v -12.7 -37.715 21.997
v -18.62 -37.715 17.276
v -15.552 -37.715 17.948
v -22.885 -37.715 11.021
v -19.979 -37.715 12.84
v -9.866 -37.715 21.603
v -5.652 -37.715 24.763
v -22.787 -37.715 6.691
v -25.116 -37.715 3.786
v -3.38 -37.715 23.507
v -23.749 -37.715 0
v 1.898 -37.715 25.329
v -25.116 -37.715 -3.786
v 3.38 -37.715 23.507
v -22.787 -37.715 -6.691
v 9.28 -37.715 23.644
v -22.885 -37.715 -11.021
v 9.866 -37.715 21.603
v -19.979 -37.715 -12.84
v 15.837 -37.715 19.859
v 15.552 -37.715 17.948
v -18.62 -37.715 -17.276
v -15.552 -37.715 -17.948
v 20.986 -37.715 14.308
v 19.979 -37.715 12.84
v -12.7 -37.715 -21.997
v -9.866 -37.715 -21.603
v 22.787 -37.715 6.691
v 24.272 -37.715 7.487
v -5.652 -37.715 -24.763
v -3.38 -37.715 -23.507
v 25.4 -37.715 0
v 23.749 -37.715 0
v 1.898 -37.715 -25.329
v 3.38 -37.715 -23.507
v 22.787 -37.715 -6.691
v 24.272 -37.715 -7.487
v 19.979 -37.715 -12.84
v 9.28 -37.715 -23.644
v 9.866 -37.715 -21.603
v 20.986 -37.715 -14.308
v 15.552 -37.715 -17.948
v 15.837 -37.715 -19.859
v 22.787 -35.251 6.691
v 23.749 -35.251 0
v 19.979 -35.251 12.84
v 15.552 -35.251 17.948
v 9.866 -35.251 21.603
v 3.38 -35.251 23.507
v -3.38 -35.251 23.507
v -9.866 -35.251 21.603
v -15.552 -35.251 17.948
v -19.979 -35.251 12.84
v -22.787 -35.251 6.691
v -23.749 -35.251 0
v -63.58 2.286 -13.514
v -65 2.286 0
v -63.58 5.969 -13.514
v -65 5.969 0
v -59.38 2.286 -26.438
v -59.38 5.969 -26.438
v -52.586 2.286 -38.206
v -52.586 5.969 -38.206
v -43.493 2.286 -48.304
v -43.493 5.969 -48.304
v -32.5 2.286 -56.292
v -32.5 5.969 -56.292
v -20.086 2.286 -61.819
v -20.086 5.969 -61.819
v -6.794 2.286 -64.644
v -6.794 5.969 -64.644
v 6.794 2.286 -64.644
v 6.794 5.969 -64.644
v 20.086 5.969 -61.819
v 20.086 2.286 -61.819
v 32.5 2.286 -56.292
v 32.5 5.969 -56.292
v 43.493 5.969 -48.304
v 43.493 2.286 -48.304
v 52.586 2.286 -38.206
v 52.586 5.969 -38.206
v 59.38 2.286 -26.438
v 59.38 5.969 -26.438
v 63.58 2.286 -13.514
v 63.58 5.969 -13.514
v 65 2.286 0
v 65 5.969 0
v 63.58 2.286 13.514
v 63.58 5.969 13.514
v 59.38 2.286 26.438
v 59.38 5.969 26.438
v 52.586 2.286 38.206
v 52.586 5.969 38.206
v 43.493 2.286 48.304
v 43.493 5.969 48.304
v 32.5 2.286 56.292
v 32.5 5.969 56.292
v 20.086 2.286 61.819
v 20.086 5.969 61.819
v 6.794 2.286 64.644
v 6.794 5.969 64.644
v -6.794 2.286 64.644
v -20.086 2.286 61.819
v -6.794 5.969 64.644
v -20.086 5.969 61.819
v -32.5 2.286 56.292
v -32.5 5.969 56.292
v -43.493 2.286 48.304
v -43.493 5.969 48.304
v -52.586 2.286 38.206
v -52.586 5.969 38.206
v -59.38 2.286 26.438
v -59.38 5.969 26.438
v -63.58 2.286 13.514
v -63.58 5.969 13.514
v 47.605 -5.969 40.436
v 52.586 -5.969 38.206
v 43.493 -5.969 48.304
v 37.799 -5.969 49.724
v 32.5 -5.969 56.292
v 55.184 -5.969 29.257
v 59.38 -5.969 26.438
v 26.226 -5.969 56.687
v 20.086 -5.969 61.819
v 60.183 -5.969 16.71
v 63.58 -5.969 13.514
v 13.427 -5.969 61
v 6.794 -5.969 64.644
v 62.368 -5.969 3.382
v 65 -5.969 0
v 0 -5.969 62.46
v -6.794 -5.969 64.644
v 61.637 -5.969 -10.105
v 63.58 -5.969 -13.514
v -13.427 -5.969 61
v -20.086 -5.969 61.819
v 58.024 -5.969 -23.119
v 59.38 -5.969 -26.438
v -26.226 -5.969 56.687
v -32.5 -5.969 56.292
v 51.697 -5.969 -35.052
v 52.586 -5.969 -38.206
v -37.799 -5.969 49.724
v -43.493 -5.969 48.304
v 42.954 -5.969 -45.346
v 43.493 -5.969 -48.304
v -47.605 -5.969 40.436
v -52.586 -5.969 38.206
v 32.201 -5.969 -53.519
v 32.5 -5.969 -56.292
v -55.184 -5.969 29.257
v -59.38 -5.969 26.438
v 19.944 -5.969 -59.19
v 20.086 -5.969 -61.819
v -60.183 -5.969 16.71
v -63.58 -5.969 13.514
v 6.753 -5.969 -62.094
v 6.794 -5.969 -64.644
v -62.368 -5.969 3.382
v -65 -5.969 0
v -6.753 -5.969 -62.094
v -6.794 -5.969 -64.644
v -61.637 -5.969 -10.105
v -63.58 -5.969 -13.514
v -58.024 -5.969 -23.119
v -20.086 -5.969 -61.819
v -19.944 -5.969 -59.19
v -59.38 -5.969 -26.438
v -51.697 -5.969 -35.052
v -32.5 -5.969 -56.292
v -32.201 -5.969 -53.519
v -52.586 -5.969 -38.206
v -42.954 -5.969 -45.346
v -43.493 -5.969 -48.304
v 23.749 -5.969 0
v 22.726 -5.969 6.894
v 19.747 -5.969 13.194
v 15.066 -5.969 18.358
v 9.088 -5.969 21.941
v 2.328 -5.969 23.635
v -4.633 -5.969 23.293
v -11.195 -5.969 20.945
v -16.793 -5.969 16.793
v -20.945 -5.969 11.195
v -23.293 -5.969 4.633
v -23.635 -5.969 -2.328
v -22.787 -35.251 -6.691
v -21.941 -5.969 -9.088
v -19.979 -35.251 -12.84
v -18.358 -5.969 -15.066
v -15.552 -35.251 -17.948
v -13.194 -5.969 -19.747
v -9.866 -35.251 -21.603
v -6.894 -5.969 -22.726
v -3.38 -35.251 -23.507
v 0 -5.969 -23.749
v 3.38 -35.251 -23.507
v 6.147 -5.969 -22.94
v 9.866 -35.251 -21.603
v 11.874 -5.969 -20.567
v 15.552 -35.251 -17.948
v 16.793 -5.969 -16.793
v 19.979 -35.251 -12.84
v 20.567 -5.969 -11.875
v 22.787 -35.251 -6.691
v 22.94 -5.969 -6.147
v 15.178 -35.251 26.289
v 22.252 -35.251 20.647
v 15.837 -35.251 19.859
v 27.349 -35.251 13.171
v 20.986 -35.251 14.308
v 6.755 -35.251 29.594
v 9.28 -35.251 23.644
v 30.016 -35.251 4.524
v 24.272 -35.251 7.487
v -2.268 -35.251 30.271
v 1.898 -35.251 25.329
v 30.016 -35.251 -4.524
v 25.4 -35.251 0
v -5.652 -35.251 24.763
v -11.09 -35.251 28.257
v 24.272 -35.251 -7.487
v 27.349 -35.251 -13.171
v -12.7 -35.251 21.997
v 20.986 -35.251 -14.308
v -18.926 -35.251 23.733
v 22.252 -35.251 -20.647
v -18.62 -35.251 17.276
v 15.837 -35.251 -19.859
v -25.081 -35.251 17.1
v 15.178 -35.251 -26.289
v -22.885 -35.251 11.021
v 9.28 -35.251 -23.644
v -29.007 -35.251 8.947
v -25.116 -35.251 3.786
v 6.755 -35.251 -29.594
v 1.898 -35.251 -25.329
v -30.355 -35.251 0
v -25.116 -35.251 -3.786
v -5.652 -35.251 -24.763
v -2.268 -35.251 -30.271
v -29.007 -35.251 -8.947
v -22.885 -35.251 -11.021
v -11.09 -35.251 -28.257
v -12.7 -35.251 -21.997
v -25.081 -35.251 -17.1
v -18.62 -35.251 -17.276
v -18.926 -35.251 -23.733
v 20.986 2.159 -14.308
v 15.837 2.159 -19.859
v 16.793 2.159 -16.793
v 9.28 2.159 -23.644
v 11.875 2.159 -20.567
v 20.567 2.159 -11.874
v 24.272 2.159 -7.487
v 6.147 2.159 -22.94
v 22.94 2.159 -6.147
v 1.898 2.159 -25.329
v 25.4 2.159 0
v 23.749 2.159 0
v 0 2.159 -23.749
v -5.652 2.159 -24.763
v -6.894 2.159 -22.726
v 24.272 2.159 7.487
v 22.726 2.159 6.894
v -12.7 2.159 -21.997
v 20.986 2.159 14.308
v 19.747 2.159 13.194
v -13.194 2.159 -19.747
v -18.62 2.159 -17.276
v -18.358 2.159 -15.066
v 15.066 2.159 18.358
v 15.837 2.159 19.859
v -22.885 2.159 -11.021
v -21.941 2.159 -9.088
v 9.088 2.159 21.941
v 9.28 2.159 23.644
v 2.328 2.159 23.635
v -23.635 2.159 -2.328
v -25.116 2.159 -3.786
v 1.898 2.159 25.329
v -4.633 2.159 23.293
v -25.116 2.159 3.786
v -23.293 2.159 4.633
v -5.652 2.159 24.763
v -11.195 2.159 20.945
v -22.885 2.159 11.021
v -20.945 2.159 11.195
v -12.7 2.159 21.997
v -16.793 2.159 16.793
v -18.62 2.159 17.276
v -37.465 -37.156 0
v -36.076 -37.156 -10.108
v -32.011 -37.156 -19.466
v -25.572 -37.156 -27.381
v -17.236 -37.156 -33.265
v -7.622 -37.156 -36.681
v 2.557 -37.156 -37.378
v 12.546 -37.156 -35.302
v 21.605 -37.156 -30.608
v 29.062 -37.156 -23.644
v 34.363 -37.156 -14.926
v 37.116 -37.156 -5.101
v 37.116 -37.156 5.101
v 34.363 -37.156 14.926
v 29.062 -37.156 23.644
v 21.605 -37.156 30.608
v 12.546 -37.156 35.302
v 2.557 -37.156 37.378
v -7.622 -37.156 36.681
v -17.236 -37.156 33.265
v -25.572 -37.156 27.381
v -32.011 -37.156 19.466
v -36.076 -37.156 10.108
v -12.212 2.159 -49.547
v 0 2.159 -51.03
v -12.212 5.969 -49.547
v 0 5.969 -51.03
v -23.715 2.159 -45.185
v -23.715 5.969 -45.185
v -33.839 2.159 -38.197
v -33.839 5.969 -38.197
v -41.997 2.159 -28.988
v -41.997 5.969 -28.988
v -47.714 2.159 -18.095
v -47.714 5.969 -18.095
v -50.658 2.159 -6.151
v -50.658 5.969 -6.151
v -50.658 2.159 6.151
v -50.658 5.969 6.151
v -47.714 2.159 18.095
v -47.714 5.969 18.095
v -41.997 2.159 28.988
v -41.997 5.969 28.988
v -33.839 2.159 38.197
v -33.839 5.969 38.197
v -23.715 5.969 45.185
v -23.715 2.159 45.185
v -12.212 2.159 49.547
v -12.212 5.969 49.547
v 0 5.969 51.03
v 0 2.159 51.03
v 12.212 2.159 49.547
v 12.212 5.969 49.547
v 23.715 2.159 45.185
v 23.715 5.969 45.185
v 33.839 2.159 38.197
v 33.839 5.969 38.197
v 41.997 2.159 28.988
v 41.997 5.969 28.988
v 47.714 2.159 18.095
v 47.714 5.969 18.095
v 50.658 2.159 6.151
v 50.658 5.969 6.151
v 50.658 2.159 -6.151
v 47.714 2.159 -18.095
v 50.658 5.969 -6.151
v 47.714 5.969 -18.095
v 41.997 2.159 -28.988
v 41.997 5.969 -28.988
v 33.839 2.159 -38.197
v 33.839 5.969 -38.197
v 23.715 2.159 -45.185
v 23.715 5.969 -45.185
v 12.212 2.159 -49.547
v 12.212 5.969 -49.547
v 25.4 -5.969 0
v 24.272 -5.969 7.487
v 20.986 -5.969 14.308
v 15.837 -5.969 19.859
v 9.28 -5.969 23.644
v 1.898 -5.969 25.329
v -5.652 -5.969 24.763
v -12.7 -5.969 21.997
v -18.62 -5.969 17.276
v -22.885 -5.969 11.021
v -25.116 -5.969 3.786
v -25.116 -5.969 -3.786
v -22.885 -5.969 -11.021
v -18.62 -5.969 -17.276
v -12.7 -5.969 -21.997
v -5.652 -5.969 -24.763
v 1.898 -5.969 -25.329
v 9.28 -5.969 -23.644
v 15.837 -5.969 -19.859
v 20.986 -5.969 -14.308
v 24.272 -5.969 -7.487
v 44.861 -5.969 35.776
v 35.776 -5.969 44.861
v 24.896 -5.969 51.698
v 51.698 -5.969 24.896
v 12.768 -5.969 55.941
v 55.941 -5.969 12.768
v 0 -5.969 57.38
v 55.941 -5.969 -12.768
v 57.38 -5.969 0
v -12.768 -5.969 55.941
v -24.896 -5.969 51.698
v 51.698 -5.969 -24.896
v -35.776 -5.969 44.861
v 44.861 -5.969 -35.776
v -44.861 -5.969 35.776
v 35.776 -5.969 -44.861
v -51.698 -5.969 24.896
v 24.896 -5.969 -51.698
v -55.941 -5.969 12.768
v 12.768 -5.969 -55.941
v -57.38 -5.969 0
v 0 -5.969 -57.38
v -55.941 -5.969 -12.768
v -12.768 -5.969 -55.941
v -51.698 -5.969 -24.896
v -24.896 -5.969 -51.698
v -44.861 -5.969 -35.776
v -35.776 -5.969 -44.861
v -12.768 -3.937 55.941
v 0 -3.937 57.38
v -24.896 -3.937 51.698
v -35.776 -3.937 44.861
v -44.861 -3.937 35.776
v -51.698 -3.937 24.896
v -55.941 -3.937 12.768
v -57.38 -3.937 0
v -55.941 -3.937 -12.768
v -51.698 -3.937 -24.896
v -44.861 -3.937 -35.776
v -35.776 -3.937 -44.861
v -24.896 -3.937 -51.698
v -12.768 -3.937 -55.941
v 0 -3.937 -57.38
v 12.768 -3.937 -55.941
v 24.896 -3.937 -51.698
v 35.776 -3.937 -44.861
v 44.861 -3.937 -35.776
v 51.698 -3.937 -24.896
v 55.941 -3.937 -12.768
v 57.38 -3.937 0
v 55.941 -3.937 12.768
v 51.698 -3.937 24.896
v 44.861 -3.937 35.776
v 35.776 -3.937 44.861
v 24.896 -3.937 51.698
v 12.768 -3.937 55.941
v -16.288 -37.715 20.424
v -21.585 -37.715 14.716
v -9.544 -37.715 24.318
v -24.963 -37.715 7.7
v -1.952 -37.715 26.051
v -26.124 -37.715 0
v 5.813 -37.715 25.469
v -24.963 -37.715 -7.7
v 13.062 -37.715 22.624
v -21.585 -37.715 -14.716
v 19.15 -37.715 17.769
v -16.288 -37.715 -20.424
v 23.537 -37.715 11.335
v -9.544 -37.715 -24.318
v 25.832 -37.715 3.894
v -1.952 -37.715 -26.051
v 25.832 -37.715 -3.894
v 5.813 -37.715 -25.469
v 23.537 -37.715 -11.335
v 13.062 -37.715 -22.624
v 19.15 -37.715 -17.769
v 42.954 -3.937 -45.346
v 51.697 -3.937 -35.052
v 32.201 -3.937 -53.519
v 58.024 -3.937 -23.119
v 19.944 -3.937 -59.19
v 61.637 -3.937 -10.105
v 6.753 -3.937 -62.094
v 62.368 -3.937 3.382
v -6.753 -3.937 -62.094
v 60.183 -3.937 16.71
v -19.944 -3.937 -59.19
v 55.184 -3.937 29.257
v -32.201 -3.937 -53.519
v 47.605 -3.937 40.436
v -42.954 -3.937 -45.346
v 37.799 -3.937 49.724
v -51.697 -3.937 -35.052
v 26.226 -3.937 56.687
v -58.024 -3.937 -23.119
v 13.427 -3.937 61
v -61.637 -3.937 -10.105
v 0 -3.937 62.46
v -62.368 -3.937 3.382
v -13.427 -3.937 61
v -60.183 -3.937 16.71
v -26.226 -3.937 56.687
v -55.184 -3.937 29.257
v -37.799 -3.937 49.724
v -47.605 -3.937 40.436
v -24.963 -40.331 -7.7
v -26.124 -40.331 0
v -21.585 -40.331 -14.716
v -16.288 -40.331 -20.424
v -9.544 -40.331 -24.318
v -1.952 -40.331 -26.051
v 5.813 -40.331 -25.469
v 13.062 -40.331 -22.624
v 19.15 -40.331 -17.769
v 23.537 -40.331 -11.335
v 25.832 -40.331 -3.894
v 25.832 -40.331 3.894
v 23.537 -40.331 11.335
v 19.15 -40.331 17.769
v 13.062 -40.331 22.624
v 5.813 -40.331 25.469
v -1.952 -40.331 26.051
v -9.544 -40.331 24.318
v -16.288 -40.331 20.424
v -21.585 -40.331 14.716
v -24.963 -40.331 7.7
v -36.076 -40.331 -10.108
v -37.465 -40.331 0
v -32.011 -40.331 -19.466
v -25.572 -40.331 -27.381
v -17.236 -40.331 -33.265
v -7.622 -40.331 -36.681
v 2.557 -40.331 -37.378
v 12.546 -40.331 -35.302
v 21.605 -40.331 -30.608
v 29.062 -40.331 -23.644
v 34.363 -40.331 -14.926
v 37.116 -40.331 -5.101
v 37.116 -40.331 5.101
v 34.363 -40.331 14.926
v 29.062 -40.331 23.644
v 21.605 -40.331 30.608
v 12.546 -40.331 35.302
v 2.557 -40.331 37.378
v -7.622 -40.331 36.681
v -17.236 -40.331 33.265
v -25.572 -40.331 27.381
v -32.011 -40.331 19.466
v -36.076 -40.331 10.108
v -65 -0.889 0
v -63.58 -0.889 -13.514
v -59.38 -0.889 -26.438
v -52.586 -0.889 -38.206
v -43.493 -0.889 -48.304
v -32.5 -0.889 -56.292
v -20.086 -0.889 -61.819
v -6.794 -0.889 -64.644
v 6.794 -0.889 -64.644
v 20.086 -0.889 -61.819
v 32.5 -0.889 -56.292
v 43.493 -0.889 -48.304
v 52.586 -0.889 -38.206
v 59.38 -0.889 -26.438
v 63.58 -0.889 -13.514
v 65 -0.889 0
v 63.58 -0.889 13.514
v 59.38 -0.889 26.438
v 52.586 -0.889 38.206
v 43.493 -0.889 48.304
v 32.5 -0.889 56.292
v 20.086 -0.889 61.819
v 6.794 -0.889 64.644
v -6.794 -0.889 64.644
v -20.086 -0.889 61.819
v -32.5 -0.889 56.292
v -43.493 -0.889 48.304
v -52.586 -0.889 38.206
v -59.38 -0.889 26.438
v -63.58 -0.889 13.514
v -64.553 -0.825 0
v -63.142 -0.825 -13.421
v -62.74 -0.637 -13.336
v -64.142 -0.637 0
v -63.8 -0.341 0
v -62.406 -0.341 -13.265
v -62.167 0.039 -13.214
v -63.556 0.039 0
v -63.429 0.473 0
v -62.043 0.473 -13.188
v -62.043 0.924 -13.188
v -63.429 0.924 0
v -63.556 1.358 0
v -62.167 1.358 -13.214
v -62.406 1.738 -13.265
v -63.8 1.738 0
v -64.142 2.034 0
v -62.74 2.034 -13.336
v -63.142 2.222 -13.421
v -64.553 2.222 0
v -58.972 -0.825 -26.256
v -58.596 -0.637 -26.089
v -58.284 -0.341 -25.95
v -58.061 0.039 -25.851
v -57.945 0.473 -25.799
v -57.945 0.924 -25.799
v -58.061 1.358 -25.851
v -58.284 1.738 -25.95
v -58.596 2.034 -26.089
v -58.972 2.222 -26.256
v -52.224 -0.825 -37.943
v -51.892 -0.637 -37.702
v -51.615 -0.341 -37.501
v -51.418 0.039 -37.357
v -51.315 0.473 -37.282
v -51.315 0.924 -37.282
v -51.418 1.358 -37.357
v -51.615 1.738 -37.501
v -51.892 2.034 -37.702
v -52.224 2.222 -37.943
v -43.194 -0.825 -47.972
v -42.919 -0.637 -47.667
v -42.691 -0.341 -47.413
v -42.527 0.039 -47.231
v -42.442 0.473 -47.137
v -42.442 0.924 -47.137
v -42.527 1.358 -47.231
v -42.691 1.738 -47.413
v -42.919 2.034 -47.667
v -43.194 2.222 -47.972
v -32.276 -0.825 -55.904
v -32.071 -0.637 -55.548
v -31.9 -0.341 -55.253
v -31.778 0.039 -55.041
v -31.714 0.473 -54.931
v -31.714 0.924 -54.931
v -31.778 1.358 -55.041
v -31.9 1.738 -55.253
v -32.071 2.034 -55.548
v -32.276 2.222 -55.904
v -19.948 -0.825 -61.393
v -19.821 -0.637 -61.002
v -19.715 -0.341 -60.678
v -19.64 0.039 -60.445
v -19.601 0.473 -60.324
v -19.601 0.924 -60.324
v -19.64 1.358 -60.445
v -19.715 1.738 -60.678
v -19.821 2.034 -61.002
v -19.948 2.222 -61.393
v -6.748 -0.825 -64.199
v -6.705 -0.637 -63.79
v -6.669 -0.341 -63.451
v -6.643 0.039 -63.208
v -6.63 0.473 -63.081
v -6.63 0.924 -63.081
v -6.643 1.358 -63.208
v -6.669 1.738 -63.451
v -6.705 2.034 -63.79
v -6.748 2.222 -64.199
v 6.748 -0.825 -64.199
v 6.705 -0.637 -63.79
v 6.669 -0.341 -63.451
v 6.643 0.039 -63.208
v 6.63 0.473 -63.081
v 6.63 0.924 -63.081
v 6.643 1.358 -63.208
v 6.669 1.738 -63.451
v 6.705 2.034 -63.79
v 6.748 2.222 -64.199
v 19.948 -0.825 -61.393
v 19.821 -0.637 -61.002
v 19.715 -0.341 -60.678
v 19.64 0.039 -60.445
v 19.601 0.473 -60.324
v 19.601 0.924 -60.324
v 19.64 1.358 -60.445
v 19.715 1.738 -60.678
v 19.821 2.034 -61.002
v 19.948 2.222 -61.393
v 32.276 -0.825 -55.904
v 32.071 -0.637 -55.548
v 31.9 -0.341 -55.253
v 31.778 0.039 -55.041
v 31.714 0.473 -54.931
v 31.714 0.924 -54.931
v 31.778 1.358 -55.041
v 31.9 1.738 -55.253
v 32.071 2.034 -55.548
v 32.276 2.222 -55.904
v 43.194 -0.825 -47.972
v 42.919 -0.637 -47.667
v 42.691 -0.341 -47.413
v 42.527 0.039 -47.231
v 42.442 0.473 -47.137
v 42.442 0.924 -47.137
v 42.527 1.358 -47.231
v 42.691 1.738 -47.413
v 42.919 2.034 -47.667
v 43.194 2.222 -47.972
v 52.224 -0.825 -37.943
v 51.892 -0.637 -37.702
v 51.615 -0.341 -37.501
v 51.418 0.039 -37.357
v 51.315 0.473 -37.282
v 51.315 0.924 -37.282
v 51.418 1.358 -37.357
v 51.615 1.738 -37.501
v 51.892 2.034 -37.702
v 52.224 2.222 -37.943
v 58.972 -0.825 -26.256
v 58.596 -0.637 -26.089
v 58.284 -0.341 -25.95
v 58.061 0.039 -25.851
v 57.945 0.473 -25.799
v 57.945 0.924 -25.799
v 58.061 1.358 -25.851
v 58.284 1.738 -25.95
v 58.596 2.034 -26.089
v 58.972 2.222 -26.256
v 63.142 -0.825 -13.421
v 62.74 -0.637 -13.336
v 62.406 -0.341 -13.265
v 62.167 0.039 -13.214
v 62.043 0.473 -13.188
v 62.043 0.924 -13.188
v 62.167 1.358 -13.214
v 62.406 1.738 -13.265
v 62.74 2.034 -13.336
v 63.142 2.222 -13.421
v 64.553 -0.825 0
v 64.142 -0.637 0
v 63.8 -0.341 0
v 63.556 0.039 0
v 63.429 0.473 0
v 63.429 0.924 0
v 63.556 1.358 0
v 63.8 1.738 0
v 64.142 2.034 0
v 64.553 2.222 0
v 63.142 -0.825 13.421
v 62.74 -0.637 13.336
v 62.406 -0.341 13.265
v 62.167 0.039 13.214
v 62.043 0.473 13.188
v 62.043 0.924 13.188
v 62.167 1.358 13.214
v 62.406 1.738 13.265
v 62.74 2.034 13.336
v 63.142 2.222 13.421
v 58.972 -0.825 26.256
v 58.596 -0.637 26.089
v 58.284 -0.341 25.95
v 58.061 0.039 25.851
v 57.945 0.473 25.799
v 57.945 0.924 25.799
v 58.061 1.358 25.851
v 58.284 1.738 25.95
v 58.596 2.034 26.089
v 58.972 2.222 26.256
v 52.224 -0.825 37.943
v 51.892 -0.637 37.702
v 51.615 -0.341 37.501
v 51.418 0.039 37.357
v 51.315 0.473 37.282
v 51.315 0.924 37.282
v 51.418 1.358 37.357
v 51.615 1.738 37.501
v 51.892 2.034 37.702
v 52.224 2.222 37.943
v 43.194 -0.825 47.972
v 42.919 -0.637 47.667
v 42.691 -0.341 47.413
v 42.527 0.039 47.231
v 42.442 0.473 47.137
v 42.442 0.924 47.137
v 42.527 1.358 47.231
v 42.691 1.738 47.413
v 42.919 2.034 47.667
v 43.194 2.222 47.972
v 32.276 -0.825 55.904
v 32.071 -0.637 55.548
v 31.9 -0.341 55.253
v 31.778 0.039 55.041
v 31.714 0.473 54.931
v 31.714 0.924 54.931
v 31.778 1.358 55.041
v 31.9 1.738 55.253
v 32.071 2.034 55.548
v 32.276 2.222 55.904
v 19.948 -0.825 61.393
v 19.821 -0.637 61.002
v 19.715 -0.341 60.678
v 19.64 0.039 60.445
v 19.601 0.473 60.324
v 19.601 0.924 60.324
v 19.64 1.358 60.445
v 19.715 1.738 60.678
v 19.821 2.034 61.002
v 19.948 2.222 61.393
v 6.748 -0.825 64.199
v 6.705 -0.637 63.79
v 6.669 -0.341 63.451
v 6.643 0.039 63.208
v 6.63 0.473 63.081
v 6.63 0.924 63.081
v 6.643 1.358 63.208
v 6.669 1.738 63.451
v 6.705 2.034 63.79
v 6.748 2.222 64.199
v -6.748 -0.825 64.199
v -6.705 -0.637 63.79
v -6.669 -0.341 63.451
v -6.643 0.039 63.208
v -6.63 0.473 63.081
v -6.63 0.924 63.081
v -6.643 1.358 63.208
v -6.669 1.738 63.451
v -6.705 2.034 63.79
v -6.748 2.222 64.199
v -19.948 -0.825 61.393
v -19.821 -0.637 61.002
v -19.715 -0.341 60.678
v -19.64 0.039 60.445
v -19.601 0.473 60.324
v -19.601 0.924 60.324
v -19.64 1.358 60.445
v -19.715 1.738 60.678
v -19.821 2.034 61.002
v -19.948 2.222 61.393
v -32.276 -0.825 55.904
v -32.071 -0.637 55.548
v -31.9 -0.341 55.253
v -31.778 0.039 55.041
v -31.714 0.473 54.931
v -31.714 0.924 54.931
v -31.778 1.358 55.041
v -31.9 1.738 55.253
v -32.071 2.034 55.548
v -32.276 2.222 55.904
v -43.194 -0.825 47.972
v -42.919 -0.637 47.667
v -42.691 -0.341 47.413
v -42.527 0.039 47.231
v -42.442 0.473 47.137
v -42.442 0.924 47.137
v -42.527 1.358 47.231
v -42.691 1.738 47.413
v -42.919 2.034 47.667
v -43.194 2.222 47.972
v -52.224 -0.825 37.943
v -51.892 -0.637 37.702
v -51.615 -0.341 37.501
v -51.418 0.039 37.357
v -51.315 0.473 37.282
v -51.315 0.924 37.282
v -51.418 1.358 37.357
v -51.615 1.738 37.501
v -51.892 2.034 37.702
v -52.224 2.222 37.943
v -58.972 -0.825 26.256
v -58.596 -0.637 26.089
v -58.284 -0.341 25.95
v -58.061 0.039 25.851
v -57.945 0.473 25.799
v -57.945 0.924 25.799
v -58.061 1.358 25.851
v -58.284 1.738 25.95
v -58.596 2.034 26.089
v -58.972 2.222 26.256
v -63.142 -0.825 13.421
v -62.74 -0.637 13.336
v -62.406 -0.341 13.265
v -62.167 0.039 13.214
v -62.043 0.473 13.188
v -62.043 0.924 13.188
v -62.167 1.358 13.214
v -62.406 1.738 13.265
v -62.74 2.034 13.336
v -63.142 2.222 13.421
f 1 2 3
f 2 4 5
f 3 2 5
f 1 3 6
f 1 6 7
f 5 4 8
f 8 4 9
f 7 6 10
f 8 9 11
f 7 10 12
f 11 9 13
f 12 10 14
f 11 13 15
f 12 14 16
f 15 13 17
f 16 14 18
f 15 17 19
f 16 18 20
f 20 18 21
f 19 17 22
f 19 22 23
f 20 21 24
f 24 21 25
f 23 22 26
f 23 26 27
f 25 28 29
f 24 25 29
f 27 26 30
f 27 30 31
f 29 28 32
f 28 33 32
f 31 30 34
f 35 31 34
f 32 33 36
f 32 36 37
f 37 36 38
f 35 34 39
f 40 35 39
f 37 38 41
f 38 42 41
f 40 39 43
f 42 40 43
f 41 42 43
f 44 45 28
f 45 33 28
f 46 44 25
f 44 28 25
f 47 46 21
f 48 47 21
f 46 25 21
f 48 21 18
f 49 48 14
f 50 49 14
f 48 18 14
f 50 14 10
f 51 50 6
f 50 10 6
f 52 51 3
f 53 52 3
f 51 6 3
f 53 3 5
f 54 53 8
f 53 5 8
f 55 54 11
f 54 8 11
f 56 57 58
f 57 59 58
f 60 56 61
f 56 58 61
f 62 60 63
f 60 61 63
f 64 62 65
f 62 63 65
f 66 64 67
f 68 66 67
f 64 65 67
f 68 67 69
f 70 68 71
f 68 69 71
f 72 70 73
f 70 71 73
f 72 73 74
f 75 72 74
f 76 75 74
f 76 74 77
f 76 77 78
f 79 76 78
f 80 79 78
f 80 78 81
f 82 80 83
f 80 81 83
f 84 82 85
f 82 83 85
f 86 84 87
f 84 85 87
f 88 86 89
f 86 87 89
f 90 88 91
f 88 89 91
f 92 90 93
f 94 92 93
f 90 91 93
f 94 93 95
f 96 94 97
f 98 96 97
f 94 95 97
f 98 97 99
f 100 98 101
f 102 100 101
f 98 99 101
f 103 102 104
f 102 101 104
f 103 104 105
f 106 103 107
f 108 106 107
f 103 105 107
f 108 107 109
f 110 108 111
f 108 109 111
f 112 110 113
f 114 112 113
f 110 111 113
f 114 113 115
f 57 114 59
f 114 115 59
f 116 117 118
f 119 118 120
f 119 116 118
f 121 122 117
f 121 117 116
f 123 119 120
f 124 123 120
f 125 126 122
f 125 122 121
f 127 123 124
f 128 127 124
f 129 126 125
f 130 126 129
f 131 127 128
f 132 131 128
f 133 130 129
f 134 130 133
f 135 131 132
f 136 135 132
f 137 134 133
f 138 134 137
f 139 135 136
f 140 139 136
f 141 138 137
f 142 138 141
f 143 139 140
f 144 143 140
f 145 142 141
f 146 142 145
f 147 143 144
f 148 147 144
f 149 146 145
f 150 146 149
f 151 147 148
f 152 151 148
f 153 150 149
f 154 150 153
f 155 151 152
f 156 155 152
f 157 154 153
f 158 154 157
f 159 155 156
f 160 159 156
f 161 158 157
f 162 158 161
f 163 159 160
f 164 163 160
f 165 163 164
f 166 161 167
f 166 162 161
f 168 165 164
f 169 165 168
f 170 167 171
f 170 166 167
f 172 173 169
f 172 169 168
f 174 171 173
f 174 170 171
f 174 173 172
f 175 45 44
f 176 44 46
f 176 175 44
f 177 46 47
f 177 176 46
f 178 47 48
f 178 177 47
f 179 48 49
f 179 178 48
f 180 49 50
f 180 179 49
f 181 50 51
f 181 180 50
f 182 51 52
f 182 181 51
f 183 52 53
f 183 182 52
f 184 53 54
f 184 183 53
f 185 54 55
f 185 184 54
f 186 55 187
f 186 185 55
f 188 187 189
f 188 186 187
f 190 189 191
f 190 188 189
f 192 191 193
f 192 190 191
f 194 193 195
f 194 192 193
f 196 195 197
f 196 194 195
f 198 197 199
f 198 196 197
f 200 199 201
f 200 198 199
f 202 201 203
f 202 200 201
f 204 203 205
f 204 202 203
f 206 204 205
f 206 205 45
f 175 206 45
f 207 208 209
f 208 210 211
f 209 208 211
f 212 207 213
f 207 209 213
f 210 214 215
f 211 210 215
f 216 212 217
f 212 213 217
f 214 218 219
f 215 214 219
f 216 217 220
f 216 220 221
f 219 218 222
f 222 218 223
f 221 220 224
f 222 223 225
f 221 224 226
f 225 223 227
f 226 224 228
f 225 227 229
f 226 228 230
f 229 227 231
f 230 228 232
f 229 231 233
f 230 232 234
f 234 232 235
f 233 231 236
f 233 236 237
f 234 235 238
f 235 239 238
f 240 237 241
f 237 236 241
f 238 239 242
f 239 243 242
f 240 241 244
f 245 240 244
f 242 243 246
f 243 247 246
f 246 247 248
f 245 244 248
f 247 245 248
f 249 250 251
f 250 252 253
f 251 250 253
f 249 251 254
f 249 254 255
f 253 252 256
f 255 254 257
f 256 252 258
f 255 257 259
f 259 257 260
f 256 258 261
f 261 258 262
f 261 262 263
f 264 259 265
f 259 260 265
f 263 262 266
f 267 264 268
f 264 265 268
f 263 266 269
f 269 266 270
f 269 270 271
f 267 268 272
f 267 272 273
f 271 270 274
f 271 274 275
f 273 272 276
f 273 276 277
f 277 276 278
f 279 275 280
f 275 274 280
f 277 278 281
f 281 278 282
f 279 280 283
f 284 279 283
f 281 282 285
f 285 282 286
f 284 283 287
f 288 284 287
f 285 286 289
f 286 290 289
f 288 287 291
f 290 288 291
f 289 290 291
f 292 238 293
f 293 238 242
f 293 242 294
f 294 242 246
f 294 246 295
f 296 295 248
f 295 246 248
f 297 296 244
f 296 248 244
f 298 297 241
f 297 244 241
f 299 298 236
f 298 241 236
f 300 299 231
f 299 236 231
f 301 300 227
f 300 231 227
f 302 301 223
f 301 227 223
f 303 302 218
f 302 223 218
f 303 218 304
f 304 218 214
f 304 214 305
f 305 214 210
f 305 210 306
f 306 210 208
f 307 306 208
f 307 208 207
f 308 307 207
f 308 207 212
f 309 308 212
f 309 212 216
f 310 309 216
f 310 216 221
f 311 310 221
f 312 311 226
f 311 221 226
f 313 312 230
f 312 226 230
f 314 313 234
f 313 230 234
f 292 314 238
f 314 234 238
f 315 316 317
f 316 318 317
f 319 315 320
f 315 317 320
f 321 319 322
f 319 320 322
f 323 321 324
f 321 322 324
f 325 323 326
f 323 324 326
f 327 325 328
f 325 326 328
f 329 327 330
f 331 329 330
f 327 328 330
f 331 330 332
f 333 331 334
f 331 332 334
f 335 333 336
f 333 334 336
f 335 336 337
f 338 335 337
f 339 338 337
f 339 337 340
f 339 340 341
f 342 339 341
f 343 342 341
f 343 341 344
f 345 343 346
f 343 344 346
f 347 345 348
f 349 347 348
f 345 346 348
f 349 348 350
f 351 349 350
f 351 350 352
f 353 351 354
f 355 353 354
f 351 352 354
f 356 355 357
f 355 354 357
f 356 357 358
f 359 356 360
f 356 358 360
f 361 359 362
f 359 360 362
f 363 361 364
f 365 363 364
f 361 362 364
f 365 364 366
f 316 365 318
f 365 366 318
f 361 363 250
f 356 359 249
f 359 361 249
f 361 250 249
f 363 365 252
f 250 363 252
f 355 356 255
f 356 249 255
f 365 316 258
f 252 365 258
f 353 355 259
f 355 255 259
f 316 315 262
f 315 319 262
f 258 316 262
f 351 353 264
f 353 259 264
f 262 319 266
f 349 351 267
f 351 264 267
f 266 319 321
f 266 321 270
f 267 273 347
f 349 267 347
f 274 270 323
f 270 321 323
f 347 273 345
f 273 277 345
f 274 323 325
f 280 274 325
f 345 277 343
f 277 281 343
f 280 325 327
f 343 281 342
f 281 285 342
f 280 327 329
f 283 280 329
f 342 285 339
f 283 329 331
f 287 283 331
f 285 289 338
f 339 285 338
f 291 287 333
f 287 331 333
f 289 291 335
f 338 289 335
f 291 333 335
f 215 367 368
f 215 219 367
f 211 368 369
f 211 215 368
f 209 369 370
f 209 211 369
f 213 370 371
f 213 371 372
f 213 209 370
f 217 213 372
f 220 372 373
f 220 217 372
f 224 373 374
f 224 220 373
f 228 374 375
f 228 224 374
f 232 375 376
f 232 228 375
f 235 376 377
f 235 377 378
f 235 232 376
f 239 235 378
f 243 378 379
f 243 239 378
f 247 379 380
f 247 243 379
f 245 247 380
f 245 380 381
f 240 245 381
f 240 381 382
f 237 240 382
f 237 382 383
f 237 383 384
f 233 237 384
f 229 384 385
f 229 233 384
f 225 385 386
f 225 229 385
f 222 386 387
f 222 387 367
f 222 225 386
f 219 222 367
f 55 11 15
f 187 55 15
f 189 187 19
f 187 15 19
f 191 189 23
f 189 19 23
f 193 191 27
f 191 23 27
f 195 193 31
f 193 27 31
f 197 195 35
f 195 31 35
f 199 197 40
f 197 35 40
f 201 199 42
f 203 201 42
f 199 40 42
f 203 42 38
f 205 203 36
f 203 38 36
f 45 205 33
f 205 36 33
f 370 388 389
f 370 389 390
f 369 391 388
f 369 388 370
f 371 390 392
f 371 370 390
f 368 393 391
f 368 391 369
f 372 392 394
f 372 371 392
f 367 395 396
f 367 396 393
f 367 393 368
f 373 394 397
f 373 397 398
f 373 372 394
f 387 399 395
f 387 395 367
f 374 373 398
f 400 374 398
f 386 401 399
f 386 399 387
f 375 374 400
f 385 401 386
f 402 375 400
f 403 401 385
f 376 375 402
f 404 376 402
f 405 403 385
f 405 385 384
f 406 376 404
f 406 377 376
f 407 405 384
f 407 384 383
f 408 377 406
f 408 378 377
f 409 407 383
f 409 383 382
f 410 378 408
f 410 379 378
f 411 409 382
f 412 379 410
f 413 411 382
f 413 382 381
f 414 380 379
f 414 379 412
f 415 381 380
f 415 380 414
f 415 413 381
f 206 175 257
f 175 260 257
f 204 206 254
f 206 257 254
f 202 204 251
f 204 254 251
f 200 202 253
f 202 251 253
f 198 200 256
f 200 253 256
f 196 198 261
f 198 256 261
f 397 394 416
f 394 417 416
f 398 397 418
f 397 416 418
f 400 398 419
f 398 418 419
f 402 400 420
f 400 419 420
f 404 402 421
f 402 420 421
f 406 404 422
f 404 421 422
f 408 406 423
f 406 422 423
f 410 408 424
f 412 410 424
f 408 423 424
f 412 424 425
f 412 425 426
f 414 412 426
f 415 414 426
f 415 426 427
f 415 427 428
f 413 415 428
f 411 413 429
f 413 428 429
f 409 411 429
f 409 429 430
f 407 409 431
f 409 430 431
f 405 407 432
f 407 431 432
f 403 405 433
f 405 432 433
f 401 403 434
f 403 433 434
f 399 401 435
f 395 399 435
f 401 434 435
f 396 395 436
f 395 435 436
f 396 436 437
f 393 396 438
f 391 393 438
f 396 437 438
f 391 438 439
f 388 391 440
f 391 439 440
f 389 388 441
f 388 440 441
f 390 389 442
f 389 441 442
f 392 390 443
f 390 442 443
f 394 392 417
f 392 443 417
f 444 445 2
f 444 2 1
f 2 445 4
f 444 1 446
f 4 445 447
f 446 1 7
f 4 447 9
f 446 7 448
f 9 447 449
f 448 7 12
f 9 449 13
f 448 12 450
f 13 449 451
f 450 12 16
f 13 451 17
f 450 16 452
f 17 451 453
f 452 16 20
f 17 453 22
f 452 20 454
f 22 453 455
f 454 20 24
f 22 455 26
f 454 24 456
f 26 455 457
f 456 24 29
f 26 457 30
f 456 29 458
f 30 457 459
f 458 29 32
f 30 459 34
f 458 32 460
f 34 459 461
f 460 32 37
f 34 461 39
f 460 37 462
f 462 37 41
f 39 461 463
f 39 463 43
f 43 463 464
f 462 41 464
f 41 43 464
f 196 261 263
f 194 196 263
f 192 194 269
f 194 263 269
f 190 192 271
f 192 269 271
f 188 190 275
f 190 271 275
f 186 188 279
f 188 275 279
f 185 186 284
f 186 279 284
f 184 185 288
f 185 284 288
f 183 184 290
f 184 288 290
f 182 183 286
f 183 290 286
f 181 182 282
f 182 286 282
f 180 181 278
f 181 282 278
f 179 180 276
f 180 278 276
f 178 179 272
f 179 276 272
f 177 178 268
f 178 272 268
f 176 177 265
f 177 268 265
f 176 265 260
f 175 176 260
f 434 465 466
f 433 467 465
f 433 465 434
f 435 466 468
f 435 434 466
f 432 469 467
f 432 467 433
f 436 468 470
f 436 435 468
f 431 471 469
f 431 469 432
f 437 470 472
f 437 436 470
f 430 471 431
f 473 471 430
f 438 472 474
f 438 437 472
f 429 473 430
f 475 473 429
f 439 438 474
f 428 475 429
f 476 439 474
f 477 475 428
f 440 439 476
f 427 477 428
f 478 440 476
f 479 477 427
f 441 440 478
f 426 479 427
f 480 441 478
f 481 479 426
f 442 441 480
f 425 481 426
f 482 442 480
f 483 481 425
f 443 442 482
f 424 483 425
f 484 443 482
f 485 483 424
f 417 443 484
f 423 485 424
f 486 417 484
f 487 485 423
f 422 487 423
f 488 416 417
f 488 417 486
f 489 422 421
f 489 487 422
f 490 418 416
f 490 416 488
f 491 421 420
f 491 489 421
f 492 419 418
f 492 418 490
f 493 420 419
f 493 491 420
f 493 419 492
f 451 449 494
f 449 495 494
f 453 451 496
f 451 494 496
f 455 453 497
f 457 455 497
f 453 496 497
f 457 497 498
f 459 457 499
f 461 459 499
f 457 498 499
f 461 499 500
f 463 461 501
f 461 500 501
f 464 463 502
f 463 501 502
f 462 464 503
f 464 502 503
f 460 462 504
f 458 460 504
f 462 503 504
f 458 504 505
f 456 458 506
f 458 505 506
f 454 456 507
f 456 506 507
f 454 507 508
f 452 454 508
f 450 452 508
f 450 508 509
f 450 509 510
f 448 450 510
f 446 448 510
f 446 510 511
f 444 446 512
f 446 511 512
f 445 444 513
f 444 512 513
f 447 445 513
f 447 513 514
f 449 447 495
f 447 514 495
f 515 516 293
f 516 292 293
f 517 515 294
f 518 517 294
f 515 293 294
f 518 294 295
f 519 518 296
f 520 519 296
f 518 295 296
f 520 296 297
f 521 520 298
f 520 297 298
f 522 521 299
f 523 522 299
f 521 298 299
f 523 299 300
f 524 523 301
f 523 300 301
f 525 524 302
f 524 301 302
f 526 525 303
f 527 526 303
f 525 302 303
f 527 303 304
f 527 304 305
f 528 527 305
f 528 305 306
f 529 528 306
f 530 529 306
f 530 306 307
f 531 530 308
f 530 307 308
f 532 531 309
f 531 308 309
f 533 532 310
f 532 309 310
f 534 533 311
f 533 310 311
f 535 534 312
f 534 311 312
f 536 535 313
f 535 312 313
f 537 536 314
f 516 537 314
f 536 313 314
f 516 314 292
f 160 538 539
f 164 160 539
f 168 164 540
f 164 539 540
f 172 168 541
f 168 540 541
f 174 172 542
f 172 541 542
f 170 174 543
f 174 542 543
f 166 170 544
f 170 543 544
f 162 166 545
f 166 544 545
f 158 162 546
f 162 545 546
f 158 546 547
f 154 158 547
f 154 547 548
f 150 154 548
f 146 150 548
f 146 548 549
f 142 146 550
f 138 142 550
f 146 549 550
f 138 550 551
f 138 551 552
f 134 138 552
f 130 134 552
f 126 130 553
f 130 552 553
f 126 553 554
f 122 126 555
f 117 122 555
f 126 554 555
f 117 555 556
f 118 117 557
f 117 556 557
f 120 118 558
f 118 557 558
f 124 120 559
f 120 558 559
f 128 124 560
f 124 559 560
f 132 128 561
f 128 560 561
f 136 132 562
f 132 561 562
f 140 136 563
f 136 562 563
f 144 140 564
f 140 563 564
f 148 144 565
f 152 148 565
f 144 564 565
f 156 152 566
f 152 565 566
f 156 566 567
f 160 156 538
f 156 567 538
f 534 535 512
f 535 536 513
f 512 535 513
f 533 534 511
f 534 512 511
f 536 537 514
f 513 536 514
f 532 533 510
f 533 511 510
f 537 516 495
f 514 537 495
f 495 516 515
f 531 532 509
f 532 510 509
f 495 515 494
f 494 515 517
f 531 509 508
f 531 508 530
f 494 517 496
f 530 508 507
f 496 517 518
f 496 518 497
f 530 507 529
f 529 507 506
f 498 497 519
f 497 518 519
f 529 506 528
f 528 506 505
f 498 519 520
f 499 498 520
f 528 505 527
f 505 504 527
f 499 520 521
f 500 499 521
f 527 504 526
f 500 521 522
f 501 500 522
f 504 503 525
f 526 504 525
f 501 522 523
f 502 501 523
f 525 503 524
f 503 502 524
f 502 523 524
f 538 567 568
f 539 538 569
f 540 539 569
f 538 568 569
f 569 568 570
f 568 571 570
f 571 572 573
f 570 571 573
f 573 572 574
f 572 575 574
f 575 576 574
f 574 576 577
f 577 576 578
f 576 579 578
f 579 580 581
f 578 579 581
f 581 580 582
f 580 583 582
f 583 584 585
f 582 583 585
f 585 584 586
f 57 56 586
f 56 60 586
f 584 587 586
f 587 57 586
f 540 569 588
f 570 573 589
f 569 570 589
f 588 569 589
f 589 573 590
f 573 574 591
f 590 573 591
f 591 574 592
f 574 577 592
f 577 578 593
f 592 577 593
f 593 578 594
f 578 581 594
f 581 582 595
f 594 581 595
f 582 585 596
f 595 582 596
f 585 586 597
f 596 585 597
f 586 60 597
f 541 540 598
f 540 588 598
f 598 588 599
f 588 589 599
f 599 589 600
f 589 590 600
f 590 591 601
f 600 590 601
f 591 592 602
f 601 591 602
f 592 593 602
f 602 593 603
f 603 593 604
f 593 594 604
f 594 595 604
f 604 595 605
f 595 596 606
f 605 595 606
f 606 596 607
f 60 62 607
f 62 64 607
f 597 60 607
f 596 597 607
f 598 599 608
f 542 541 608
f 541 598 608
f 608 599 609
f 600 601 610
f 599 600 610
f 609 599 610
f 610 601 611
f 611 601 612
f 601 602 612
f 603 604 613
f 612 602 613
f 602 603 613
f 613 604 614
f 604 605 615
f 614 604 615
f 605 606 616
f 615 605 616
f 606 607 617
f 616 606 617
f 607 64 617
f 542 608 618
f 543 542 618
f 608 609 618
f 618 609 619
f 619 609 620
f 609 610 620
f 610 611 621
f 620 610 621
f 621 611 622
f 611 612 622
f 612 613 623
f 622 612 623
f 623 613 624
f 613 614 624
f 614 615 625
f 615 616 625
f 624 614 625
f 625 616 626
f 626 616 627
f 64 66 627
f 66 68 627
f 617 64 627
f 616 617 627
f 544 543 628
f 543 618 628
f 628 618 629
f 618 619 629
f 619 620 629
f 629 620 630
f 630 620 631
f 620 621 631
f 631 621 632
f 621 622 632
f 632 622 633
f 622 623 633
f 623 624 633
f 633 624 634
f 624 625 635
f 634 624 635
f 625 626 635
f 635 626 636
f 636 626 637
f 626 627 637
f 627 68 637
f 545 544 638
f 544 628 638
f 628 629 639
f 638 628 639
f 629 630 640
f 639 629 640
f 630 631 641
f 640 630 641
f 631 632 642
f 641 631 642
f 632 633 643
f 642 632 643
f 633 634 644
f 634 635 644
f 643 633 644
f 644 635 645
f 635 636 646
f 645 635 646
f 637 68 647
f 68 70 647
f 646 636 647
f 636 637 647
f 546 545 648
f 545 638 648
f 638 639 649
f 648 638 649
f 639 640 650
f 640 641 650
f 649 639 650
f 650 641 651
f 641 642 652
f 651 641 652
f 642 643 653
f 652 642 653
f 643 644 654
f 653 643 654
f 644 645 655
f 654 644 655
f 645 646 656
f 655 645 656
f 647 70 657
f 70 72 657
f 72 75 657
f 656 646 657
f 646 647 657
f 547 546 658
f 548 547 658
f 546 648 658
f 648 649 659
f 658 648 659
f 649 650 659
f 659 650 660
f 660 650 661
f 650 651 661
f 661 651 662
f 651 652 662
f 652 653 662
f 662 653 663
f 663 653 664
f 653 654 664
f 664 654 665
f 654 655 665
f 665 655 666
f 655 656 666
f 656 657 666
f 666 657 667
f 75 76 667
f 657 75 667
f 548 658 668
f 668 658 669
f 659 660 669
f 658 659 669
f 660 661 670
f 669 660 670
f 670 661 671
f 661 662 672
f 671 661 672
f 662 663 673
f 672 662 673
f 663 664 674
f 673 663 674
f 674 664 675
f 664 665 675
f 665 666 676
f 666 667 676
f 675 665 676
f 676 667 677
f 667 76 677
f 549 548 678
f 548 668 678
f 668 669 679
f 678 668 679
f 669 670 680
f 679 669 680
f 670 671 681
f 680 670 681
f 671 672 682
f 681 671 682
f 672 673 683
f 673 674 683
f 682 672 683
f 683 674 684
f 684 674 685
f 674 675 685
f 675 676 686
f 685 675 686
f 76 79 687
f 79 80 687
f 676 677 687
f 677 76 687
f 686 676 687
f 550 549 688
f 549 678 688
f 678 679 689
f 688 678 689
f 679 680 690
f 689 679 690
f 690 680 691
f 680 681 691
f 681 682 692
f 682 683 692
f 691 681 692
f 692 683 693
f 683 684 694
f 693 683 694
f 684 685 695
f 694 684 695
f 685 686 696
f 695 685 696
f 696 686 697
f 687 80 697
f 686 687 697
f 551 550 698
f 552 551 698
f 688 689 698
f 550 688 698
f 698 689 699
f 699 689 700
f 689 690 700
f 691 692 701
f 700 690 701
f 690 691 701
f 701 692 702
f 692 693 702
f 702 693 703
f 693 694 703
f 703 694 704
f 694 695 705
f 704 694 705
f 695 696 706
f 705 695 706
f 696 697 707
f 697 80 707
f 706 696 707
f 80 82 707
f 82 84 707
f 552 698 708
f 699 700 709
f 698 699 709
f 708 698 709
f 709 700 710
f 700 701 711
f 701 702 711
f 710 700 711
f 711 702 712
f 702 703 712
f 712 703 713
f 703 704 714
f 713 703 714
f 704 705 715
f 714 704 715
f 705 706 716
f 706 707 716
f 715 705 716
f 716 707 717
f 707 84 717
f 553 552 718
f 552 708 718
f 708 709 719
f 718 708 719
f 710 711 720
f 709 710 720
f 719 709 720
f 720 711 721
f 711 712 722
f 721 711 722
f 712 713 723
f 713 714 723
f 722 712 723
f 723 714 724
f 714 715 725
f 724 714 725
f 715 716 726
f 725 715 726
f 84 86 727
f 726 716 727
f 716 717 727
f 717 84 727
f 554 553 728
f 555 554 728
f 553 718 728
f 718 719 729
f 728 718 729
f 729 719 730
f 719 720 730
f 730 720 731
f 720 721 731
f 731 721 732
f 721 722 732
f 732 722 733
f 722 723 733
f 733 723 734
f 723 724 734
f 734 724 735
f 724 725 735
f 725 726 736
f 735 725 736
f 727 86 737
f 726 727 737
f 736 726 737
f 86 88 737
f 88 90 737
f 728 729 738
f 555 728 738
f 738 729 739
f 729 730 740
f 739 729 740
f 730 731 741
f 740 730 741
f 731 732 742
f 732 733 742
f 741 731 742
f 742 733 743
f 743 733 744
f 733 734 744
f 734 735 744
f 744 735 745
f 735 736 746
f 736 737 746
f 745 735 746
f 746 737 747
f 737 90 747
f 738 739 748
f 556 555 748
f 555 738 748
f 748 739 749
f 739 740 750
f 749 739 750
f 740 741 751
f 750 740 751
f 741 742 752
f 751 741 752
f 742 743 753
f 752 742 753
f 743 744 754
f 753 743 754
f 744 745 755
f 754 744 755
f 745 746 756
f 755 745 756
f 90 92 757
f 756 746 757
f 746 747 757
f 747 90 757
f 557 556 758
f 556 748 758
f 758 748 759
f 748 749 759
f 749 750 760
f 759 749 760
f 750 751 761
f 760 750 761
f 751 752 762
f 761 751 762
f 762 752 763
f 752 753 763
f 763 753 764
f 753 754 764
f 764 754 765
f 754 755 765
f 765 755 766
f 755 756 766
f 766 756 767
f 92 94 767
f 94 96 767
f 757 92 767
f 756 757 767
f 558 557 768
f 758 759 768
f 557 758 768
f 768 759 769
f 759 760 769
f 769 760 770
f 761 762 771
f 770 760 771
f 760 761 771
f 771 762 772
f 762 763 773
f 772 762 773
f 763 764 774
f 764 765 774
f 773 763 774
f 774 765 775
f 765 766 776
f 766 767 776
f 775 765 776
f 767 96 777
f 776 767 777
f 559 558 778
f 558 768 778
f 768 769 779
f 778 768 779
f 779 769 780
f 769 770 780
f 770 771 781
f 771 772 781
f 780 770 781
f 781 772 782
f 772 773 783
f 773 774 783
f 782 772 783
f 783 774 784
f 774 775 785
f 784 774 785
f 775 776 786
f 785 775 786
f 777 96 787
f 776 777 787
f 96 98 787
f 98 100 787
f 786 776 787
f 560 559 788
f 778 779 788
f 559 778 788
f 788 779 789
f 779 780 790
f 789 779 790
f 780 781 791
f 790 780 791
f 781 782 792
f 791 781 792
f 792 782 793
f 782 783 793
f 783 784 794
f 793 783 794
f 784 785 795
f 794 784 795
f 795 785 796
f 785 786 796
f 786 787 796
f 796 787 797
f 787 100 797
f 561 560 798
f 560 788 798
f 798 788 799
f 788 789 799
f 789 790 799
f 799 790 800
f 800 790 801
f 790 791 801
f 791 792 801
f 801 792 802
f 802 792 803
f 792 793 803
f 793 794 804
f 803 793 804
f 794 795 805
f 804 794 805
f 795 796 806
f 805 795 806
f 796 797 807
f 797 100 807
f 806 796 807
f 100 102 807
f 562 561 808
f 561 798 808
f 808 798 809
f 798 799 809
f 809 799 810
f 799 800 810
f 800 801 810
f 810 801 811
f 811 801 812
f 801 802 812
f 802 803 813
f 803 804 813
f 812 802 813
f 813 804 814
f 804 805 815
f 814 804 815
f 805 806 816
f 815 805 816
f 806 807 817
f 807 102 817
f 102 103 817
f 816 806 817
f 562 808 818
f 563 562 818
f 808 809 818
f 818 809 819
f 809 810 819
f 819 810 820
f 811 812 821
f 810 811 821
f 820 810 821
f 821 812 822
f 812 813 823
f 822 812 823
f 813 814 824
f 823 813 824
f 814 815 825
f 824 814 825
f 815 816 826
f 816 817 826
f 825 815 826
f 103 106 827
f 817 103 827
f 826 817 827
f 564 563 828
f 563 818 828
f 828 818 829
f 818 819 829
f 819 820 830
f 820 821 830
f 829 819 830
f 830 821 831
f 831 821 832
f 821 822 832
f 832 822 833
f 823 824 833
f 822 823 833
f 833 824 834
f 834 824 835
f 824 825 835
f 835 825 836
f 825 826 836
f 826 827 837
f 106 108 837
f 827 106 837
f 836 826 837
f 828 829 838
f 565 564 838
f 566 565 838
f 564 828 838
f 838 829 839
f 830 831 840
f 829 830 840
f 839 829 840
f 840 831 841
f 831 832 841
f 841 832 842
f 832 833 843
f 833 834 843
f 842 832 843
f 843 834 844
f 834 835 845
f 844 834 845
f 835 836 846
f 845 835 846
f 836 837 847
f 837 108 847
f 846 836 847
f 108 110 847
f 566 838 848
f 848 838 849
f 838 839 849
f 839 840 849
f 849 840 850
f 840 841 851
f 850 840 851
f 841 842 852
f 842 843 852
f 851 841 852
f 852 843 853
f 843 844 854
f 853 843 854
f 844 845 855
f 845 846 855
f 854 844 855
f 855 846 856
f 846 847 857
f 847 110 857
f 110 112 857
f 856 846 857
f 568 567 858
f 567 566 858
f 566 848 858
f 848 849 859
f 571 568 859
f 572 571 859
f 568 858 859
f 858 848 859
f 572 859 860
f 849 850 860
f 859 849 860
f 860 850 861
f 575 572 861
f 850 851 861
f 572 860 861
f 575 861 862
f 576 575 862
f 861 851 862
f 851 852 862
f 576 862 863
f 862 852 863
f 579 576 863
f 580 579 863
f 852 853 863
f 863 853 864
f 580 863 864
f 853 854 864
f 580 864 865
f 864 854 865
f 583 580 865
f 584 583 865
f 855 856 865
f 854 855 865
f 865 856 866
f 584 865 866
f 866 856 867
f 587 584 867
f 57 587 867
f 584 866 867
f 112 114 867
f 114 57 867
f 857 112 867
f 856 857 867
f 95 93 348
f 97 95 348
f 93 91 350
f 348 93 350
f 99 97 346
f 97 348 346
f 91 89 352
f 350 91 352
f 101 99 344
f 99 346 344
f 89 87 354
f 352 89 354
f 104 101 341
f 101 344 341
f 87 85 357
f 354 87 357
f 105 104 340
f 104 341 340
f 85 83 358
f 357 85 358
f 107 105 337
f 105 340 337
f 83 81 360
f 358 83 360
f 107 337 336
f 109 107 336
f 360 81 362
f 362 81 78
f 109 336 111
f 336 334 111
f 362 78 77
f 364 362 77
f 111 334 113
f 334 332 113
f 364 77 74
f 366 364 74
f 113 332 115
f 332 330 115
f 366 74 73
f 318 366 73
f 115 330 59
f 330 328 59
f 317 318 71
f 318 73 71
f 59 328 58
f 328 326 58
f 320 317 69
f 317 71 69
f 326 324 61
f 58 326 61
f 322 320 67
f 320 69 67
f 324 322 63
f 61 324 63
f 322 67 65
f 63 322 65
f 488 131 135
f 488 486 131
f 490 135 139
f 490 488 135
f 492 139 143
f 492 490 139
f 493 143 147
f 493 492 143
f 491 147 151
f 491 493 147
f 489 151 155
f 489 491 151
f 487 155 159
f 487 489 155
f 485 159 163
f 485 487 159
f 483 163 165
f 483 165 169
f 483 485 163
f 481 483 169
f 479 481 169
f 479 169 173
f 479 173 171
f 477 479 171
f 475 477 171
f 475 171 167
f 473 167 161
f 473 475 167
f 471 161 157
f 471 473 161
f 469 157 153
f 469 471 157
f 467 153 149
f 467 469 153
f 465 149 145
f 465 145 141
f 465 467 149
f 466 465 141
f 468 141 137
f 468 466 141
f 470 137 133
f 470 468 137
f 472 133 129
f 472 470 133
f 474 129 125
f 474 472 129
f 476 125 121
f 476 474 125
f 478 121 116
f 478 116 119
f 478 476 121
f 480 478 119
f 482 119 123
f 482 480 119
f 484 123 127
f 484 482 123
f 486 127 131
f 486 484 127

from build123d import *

# Parameters (mm, degrees)
SKETCH1_W  = 64.999999997
SKETCH1_H  = 11.938
SKETCH13_W = 5.08
SKETCH13_H = 2.032


with BuildPart() as part:
    # Sketch1 → Blank (revolve)
    with BuildSketch(Plane.XY):
        with Locations((-32.499999999, 0)):
            Rectangle(SKETCH1_W, SKETCH1_H)
    revolve(axis=Axis((0, 5.969, 0), (0, -1, 0)))

    # Sketch7 → Single Side Bore (revolve, cut)
    with BuildSketch(Plane.XY, mode=Mode.PRIVATE) as single_side_bore_sk:
        Polygon((-23.749, -5.969), (-23.749, 2.159), (-51.029999997, 2.159), (-51.029999997, 5.969), (0, 5.969), (0, -5.969), align=None)
    revolve(single_side_bore_sk.sketch.rotate(Axis((0, 5.969, 0), (0, 1, 0)), 270), axis=Axis((0, 5.969, 0), (0, 1, 0)), mode=Mode.SUBTRACT)



with BuildPart() as body_2:
    # Sketch9 → KF Flange (revolve)
    with BuildSketch(Plane.XY, mode=Mode.PRIVATE) as kf_flange_sk:
        Polygon((30.355443212, -35.251), (23.749, -35.251), (23.749, -37.7148), (26.1239, -37.7148), (26.1239, -40.331), (37.465, -40.331), (37.465, -37.156), align=None)
    revolve(kf_flange_sk.sketch.rotate(Axis((0, 5.969, 0), (0, -1, 0)), 180), axis=Axis((0, 5.969, 0), (0, -1, 0)))


with BuildPart() as part_1:
    add(part.part)

    add(body_2.part)  # Revolve1 merges body 2
    # Sketch8 → Revolve1 (revolve)
    with BuildSketch(Plane.XY, mode=Mode.PRIVATE) as revolve1_sk:
        Polygon((-23.749, 2.159), (-23.749, -13.081), (-23.749, -22.4748), (-23.749, -37.7148), (-25.4, -37.7148), (-25.4, -22.4748), (-25.4, -13.081), (-25.4, 2.159), align=None)
    revolve(revolve1_sk.sketch.rotate(Axis((0, 0, 0), (0, -1, 0)), 180), axis=Axis((0, 0, 0), (0, -1, 0)))

    # Sketch13 → Cut-Revolve2 (revolve, cut)
    with BuildSketch(Plane.XY, mode=Mode.PRIVATE) as cut_revolve2_sk:
        with Locations((-59.919999997, -4.953)):
            Rectangle(SKETCH13_W, SKETCH13_H)
    revolve(cut_revolve2_sk.sketch.rotate(Axis((0, 0, 0), (0, -1, 0)), 270), axis=Axis((0, 0, 0), (0, -1, 0)), mode=Mode.SUBTRACT)

    # Sketch15 → Cut-Revolve3 (revolve, cut)
    with BuildSketch(Plane.XY):
        with BuildLine():
            Line((-64.999999997, 2.286), (-64.999999997, -0.889))
            ThreePointArc((-64.999999997, -0.889), (-63.412499997, 0.6985), (-64.999999997, 2.286))
        make_face()
    revolve(axis=Axis((0, 0, 0), (0, -1, 0)), mode=Mode.SUBTRACT)


solid = part_1.part
